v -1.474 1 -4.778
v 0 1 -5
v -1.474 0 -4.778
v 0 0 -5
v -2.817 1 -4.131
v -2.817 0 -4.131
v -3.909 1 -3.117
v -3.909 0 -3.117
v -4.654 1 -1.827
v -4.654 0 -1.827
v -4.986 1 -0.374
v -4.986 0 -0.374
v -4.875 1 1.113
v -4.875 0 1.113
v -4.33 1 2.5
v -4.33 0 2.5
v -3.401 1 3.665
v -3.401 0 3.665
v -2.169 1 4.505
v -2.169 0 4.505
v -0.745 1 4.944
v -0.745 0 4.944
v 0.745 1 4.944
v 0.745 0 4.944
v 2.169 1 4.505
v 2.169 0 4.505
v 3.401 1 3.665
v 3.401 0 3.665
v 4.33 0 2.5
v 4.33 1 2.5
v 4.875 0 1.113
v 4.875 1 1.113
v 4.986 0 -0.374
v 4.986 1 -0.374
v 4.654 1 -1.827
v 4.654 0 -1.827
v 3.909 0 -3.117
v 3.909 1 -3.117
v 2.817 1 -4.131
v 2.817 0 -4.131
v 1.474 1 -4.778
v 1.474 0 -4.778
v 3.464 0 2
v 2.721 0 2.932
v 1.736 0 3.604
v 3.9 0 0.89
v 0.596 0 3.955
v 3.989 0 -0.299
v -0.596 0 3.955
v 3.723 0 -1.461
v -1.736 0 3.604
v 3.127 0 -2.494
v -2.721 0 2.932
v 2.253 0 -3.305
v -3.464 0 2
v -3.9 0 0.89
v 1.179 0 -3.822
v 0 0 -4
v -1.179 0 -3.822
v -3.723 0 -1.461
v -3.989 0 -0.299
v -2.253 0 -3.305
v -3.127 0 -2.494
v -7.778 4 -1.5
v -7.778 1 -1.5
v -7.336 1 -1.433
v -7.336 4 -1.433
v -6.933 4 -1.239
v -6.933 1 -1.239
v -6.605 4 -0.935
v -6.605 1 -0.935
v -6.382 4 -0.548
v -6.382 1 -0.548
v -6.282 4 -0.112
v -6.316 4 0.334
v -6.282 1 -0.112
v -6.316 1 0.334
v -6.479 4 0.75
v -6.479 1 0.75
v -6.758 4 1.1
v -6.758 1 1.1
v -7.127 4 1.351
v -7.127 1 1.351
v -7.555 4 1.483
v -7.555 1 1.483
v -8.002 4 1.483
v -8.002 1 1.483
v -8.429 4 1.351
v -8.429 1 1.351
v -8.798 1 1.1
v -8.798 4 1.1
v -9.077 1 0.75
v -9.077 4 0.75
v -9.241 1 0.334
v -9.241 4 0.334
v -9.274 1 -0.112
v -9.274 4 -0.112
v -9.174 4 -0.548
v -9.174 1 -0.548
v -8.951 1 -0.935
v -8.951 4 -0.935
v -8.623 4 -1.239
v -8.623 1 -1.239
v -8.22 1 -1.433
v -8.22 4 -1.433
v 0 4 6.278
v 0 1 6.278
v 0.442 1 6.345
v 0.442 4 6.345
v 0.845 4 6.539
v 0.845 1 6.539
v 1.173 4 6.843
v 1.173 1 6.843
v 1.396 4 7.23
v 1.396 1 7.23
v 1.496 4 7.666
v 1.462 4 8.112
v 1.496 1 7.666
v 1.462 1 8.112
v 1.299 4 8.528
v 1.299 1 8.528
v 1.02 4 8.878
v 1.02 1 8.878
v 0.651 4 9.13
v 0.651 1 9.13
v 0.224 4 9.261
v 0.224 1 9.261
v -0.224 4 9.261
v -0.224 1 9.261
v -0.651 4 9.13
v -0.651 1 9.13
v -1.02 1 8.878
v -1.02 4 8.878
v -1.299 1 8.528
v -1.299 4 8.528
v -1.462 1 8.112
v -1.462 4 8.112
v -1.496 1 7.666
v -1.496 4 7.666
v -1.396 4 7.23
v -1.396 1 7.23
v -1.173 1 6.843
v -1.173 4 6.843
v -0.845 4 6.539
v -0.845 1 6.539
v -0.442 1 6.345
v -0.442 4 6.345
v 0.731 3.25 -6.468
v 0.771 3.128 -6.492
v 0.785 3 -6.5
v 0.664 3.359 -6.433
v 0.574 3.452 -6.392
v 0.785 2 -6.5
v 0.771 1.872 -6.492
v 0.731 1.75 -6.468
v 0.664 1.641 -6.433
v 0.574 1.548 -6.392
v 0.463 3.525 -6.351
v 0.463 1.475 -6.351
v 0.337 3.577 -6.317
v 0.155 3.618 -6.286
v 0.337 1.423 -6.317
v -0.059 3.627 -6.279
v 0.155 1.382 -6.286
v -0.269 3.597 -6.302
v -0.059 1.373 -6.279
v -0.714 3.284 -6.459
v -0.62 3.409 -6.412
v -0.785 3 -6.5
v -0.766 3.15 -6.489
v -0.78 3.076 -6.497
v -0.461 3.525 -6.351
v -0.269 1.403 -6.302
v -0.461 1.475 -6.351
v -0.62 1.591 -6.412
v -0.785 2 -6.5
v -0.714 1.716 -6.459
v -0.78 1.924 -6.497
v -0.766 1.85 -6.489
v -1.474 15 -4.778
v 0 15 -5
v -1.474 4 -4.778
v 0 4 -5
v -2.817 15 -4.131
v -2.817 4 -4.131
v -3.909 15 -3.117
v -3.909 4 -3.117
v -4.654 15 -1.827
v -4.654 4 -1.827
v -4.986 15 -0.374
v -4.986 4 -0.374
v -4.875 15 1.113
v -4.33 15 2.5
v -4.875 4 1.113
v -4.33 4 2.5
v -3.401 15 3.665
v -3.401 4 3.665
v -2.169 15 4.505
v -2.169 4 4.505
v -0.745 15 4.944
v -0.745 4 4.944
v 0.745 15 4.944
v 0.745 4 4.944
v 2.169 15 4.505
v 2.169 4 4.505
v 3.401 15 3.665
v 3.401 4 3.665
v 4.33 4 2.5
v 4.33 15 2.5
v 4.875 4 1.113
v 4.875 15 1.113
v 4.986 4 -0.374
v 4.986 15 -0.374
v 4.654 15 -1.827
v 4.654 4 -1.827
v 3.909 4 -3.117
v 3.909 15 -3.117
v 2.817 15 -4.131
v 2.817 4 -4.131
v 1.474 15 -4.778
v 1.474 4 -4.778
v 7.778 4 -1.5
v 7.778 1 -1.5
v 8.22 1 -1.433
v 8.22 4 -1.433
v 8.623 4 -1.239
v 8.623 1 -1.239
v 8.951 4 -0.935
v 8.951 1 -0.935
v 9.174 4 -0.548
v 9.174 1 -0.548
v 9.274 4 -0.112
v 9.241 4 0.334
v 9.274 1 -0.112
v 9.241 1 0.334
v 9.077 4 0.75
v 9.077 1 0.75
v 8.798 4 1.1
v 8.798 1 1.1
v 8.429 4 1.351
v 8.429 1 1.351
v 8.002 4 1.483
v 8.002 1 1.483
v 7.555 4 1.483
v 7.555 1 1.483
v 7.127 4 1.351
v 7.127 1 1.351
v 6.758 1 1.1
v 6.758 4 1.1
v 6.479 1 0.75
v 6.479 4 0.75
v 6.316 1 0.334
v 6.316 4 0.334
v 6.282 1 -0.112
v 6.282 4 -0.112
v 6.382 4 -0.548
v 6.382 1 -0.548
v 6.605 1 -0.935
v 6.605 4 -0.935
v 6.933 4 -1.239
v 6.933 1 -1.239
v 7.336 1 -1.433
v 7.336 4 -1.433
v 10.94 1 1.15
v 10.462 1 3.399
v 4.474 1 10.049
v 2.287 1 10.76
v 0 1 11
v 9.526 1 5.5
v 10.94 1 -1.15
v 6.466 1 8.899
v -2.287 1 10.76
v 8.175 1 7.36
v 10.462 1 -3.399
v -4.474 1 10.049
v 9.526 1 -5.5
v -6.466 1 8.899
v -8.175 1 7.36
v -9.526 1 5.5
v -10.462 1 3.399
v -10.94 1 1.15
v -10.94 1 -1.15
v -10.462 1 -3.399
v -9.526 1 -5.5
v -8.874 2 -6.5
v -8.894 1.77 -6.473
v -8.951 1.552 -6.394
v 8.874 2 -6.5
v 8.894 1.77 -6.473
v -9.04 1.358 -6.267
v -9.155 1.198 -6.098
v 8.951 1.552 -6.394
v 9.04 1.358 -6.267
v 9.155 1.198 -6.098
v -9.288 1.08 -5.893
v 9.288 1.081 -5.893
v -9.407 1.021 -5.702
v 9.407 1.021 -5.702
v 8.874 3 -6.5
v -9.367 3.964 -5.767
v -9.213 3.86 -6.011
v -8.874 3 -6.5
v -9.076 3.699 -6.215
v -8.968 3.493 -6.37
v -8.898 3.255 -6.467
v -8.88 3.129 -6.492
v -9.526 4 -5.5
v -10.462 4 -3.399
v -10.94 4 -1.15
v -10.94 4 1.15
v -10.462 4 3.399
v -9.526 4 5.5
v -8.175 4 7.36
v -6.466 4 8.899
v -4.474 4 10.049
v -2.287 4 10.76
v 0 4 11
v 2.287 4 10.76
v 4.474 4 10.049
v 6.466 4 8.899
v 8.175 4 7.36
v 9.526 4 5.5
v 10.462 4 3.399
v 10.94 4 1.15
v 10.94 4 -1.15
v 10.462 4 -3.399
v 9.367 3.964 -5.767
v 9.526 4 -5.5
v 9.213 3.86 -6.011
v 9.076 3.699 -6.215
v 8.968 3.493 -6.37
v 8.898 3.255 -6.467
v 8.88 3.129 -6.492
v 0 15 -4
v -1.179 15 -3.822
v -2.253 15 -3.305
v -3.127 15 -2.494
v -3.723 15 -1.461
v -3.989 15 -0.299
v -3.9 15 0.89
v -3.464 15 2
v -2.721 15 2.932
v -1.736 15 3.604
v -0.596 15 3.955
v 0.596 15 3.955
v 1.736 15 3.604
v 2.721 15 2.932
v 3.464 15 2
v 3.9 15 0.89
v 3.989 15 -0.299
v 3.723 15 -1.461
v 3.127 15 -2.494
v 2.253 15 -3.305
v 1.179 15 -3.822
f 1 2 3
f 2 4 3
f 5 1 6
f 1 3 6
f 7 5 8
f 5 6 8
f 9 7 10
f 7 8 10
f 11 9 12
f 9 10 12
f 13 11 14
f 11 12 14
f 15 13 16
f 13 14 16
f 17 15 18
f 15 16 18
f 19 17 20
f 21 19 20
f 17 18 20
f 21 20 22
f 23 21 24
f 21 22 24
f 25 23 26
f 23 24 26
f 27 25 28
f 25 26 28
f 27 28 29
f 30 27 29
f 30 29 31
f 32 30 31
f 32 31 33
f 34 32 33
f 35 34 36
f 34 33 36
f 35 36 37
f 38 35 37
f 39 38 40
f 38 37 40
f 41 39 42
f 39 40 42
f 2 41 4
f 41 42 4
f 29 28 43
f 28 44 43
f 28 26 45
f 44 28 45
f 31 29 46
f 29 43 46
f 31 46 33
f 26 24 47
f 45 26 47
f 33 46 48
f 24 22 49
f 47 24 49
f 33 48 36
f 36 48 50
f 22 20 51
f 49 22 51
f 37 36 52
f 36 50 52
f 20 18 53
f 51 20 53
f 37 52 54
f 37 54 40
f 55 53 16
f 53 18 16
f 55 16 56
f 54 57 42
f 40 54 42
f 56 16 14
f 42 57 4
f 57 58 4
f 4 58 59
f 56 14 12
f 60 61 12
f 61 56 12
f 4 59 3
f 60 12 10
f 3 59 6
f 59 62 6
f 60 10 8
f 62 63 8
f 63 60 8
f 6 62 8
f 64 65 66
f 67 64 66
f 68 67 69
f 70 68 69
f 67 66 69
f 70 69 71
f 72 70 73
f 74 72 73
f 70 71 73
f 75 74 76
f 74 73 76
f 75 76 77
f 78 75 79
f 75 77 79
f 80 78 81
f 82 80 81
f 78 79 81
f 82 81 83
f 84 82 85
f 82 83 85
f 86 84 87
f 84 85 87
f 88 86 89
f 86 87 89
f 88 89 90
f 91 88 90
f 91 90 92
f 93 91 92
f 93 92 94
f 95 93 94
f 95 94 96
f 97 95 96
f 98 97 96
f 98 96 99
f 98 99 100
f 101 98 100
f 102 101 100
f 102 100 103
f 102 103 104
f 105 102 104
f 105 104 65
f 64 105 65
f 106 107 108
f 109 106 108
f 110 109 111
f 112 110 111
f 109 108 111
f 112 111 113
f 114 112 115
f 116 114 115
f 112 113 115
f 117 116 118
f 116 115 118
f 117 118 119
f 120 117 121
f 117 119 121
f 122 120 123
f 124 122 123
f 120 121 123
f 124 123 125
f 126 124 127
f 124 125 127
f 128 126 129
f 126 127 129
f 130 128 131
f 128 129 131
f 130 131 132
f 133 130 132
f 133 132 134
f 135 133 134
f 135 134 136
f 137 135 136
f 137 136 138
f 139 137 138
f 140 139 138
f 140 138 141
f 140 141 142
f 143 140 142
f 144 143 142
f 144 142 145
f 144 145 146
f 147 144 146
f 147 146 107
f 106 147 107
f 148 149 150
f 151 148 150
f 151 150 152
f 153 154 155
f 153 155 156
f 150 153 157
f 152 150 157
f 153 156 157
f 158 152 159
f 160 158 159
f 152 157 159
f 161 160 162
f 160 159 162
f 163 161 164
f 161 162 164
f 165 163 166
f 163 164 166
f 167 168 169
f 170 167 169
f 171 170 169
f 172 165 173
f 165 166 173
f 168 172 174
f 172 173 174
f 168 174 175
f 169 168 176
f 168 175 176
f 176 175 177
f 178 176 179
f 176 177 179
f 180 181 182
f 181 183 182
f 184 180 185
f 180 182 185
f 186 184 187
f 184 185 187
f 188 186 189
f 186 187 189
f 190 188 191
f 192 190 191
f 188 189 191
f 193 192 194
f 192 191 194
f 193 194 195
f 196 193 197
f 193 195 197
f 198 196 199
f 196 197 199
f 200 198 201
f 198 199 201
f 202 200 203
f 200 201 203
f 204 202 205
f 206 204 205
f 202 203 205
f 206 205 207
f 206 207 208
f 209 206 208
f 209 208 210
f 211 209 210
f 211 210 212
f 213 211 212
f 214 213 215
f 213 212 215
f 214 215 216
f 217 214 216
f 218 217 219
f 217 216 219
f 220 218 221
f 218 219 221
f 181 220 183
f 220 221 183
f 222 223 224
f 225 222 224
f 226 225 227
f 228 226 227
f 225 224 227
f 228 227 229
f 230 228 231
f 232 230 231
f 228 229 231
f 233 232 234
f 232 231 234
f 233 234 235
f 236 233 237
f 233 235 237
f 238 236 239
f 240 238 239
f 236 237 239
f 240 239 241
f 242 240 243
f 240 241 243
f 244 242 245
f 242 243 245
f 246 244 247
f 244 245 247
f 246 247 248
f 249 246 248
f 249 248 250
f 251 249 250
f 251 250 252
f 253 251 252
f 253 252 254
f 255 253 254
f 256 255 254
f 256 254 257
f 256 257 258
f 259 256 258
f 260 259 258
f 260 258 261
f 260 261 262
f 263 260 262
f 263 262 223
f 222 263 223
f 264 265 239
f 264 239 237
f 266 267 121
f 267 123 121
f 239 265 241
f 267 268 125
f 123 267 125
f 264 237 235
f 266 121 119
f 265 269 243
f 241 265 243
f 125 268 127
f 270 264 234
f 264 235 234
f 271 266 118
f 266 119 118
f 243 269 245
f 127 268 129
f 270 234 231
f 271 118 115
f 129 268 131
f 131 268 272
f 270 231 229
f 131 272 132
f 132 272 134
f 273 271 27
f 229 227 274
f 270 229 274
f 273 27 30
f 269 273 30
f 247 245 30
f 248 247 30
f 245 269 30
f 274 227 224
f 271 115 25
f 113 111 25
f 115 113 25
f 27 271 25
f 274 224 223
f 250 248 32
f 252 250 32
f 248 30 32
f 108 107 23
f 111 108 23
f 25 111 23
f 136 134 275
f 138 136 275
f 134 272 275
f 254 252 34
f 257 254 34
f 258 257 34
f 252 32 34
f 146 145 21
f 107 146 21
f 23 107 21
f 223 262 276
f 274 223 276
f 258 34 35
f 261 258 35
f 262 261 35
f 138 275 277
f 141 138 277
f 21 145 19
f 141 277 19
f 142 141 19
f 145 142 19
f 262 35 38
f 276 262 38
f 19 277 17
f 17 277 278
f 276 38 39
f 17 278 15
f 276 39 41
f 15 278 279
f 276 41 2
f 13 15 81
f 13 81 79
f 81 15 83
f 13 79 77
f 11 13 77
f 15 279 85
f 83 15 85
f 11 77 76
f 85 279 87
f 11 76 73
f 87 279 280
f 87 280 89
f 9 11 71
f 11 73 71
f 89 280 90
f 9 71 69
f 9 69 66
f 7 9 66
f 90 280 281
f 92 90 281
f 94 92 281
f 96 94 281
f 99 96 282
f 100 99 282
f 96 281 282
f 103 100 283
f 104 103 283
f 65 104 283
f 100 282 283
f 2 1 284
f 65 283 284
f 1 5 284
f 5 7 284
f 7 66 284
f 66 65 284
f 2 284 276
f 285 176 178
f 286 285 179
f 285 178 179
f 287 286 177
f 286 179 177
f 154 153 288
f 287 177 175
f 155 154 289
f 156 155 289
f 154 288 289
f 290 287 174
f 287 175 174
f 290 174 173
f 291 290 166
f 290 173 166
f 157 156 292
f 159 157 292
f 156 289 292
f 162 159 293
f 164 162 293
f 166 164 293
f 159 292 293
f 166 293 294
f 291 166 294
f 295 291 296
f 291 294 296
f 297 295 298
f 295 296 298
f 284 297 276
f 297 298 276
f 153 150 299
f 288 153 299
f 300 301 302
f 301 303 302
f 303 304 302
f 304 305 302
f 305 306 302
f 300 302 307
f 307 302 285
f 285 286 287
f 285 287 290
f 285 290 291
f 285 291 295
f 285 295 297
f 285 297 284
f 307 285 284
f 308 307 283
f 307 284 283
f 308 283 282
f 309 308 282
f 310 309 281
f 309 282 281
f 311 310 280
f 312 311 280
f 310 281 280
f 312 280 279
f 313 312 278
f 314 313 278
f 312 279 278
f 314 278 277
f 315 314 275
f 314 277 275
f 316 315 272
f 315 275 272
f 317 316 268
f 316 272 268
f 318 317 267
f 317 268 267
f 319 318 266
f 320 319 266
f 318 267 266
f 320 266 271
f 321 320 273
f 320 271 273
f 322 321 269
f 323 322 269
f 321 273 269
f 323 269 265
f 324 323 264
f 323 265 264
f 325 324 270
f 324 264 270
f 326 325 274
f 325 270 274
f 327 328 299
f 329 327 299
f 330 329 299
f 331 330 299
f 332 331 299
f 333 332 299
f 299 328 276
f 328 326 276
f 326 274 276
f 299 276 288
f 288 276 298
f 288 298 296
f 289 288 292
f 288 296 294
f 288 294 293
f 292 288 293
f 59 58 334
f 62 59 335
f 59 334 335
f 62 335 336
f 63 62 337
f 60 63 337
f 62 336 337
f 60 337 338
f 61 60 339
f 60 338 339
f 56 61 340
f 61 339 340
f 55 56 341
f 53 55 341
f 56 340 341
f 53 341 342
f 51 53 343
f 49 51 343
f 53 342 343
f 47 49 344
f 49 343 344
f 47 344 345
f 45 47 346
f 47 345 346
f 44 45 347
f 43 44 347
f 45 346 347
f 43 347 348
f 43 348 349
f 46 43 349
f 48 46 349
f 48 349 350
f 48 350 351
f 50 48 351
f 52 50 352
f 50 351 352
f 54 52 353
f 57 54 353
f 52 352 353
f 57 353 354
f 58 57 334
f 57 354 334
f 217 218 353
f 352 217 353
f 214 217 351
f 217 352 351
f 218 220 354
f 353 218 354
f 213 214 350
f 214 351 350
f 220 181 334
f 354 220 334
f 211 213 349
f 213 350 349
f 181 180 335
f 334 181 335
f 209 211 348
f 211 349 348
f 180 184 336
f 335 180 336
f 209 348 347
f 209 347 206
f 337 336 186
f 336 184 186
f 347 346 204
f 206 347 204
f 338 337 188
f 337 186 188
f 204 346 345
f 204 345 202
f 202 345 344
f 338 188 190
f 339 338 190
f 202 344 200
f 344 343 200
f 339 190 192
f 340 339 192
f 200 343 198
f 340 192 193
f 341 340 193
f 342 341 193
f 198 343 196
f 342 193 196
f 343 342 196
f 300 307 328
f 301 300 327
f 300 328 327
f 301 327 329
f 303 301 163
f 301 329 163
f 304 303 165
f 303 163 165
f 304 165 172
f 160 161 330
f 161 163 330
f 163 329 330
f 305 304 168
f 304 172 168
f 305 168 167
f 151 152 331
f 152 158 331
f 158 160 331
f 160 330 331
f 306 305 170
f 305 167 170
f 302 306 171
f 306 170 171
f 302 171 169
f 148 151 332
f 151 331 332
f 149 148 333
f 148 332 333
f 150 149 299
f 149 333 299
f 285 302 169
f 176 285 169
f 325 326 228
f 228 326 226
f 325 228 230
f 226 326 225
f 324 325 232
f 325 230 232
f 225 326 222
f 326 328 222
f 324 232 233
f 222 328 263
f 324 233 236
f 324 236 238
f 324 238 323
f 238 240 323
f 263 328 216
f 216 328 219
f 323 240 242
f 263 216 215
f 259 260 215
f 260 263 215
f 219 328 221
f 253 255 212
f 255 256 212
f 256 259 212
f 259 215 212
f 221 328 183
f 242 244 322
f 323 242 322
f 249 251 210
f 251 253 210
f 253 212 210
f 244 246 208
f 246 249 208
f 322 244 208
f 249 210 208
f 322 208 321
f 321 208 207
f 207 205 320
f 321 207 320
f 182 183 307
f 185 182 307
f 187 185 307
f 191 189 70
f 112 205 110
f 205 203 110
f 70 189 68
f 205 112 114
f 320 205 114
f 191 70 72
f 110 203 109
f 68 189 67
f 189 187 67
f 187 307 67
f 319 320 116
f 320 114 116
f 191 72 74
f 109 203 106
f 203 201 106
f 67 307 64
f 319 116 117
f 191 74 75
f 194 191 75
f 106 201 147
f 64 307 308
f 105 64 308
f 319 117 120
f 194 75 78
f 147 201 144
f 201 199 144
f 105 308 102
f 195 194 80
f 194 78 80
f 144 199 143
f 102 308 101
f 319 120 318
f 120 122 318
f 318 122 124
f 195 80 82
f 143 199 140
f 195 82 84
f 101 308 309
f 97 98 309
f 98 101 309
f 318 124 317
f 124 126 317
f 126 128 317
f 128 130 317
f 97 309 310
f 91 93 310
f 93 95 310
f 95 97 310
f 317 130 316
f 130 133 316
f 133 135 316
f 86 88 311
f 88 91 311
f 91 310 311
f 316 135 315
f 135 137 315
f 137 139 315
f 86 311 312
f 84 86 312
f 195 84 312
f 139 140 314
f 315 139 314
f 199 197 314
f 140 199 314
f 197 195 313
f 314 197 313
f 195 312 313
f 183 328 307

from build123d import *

# Parameters (mm, degrees)
ESQUISSE2_R             = 1.5
ENL_V_MAT_EXTRU_1_DEPTH = 21.928449536
ESQUISSE3_W             = 17.74823935
ESQUISSE3_H             = 7.774498086
ENL_V_MAT_EXTRU_2_DEPTH = 20.052558883
CONG_1_R                = 1


with BuildPart() as part:
    # Esquisse1 → Révolution1 (revolve)
    with BuildSketch(Plane.XY):
        Polygon((4, 0), (4, 15), (5, 15), (5, 4), (11, 4), (11, 1), (5, 1), (5, 0), align=None)
    revolve(axis=Axis((0, 0, 0), (0, 1, 0)))

    # Esquisse2 → Enlèv. mat.-Extru.1 (cut, through all)
    with BuildSketch(Plane.XZ.offset(-1)):
        with Locations((7.778174593, 0)):
            Circle(ESQUISSE2_R)
        with Locations((0, -7.778174593)):
            Circle(ESQUISSE2_R)
        with Locations((-7.778174593, 0)):
            Circle(ESQUISSE2_R)
        with Locations((0, 7.778174593)):
            Circle(ESQUISSE2_R)
    extrude(amount=-ENL_V_MAT_EXTRU_1_DEPTH, mode=Mode.SUBTRACT)

    # Esquisse3 → Enlèv. mat.-Extru.2 (cut, through all)
    with BuildSketch(Plane(origin=(0, 4, 0), x_dir=(1, 0, 0), z_dir=(0, 1, 0))):
        with Locations((0, 10.387249043)):
            Rectangle(ESQUISSE3_W, ESQUISSE3_H)
    extrude(amount=-ENL_V_MAT_EXTRU_2_DEPTH, mode=Mode.SUBTRACT)

    # Congé1
    cong_1_edges = [part.edges().sort_by_distance(p)[0] for p in [
        (-4.829574076, 1, -6.5),
        (-4.829574076, 4, -6.5),
    ]]
    fillet(cong_1_edges, radius=CONG_1_R)


solid = part.part
